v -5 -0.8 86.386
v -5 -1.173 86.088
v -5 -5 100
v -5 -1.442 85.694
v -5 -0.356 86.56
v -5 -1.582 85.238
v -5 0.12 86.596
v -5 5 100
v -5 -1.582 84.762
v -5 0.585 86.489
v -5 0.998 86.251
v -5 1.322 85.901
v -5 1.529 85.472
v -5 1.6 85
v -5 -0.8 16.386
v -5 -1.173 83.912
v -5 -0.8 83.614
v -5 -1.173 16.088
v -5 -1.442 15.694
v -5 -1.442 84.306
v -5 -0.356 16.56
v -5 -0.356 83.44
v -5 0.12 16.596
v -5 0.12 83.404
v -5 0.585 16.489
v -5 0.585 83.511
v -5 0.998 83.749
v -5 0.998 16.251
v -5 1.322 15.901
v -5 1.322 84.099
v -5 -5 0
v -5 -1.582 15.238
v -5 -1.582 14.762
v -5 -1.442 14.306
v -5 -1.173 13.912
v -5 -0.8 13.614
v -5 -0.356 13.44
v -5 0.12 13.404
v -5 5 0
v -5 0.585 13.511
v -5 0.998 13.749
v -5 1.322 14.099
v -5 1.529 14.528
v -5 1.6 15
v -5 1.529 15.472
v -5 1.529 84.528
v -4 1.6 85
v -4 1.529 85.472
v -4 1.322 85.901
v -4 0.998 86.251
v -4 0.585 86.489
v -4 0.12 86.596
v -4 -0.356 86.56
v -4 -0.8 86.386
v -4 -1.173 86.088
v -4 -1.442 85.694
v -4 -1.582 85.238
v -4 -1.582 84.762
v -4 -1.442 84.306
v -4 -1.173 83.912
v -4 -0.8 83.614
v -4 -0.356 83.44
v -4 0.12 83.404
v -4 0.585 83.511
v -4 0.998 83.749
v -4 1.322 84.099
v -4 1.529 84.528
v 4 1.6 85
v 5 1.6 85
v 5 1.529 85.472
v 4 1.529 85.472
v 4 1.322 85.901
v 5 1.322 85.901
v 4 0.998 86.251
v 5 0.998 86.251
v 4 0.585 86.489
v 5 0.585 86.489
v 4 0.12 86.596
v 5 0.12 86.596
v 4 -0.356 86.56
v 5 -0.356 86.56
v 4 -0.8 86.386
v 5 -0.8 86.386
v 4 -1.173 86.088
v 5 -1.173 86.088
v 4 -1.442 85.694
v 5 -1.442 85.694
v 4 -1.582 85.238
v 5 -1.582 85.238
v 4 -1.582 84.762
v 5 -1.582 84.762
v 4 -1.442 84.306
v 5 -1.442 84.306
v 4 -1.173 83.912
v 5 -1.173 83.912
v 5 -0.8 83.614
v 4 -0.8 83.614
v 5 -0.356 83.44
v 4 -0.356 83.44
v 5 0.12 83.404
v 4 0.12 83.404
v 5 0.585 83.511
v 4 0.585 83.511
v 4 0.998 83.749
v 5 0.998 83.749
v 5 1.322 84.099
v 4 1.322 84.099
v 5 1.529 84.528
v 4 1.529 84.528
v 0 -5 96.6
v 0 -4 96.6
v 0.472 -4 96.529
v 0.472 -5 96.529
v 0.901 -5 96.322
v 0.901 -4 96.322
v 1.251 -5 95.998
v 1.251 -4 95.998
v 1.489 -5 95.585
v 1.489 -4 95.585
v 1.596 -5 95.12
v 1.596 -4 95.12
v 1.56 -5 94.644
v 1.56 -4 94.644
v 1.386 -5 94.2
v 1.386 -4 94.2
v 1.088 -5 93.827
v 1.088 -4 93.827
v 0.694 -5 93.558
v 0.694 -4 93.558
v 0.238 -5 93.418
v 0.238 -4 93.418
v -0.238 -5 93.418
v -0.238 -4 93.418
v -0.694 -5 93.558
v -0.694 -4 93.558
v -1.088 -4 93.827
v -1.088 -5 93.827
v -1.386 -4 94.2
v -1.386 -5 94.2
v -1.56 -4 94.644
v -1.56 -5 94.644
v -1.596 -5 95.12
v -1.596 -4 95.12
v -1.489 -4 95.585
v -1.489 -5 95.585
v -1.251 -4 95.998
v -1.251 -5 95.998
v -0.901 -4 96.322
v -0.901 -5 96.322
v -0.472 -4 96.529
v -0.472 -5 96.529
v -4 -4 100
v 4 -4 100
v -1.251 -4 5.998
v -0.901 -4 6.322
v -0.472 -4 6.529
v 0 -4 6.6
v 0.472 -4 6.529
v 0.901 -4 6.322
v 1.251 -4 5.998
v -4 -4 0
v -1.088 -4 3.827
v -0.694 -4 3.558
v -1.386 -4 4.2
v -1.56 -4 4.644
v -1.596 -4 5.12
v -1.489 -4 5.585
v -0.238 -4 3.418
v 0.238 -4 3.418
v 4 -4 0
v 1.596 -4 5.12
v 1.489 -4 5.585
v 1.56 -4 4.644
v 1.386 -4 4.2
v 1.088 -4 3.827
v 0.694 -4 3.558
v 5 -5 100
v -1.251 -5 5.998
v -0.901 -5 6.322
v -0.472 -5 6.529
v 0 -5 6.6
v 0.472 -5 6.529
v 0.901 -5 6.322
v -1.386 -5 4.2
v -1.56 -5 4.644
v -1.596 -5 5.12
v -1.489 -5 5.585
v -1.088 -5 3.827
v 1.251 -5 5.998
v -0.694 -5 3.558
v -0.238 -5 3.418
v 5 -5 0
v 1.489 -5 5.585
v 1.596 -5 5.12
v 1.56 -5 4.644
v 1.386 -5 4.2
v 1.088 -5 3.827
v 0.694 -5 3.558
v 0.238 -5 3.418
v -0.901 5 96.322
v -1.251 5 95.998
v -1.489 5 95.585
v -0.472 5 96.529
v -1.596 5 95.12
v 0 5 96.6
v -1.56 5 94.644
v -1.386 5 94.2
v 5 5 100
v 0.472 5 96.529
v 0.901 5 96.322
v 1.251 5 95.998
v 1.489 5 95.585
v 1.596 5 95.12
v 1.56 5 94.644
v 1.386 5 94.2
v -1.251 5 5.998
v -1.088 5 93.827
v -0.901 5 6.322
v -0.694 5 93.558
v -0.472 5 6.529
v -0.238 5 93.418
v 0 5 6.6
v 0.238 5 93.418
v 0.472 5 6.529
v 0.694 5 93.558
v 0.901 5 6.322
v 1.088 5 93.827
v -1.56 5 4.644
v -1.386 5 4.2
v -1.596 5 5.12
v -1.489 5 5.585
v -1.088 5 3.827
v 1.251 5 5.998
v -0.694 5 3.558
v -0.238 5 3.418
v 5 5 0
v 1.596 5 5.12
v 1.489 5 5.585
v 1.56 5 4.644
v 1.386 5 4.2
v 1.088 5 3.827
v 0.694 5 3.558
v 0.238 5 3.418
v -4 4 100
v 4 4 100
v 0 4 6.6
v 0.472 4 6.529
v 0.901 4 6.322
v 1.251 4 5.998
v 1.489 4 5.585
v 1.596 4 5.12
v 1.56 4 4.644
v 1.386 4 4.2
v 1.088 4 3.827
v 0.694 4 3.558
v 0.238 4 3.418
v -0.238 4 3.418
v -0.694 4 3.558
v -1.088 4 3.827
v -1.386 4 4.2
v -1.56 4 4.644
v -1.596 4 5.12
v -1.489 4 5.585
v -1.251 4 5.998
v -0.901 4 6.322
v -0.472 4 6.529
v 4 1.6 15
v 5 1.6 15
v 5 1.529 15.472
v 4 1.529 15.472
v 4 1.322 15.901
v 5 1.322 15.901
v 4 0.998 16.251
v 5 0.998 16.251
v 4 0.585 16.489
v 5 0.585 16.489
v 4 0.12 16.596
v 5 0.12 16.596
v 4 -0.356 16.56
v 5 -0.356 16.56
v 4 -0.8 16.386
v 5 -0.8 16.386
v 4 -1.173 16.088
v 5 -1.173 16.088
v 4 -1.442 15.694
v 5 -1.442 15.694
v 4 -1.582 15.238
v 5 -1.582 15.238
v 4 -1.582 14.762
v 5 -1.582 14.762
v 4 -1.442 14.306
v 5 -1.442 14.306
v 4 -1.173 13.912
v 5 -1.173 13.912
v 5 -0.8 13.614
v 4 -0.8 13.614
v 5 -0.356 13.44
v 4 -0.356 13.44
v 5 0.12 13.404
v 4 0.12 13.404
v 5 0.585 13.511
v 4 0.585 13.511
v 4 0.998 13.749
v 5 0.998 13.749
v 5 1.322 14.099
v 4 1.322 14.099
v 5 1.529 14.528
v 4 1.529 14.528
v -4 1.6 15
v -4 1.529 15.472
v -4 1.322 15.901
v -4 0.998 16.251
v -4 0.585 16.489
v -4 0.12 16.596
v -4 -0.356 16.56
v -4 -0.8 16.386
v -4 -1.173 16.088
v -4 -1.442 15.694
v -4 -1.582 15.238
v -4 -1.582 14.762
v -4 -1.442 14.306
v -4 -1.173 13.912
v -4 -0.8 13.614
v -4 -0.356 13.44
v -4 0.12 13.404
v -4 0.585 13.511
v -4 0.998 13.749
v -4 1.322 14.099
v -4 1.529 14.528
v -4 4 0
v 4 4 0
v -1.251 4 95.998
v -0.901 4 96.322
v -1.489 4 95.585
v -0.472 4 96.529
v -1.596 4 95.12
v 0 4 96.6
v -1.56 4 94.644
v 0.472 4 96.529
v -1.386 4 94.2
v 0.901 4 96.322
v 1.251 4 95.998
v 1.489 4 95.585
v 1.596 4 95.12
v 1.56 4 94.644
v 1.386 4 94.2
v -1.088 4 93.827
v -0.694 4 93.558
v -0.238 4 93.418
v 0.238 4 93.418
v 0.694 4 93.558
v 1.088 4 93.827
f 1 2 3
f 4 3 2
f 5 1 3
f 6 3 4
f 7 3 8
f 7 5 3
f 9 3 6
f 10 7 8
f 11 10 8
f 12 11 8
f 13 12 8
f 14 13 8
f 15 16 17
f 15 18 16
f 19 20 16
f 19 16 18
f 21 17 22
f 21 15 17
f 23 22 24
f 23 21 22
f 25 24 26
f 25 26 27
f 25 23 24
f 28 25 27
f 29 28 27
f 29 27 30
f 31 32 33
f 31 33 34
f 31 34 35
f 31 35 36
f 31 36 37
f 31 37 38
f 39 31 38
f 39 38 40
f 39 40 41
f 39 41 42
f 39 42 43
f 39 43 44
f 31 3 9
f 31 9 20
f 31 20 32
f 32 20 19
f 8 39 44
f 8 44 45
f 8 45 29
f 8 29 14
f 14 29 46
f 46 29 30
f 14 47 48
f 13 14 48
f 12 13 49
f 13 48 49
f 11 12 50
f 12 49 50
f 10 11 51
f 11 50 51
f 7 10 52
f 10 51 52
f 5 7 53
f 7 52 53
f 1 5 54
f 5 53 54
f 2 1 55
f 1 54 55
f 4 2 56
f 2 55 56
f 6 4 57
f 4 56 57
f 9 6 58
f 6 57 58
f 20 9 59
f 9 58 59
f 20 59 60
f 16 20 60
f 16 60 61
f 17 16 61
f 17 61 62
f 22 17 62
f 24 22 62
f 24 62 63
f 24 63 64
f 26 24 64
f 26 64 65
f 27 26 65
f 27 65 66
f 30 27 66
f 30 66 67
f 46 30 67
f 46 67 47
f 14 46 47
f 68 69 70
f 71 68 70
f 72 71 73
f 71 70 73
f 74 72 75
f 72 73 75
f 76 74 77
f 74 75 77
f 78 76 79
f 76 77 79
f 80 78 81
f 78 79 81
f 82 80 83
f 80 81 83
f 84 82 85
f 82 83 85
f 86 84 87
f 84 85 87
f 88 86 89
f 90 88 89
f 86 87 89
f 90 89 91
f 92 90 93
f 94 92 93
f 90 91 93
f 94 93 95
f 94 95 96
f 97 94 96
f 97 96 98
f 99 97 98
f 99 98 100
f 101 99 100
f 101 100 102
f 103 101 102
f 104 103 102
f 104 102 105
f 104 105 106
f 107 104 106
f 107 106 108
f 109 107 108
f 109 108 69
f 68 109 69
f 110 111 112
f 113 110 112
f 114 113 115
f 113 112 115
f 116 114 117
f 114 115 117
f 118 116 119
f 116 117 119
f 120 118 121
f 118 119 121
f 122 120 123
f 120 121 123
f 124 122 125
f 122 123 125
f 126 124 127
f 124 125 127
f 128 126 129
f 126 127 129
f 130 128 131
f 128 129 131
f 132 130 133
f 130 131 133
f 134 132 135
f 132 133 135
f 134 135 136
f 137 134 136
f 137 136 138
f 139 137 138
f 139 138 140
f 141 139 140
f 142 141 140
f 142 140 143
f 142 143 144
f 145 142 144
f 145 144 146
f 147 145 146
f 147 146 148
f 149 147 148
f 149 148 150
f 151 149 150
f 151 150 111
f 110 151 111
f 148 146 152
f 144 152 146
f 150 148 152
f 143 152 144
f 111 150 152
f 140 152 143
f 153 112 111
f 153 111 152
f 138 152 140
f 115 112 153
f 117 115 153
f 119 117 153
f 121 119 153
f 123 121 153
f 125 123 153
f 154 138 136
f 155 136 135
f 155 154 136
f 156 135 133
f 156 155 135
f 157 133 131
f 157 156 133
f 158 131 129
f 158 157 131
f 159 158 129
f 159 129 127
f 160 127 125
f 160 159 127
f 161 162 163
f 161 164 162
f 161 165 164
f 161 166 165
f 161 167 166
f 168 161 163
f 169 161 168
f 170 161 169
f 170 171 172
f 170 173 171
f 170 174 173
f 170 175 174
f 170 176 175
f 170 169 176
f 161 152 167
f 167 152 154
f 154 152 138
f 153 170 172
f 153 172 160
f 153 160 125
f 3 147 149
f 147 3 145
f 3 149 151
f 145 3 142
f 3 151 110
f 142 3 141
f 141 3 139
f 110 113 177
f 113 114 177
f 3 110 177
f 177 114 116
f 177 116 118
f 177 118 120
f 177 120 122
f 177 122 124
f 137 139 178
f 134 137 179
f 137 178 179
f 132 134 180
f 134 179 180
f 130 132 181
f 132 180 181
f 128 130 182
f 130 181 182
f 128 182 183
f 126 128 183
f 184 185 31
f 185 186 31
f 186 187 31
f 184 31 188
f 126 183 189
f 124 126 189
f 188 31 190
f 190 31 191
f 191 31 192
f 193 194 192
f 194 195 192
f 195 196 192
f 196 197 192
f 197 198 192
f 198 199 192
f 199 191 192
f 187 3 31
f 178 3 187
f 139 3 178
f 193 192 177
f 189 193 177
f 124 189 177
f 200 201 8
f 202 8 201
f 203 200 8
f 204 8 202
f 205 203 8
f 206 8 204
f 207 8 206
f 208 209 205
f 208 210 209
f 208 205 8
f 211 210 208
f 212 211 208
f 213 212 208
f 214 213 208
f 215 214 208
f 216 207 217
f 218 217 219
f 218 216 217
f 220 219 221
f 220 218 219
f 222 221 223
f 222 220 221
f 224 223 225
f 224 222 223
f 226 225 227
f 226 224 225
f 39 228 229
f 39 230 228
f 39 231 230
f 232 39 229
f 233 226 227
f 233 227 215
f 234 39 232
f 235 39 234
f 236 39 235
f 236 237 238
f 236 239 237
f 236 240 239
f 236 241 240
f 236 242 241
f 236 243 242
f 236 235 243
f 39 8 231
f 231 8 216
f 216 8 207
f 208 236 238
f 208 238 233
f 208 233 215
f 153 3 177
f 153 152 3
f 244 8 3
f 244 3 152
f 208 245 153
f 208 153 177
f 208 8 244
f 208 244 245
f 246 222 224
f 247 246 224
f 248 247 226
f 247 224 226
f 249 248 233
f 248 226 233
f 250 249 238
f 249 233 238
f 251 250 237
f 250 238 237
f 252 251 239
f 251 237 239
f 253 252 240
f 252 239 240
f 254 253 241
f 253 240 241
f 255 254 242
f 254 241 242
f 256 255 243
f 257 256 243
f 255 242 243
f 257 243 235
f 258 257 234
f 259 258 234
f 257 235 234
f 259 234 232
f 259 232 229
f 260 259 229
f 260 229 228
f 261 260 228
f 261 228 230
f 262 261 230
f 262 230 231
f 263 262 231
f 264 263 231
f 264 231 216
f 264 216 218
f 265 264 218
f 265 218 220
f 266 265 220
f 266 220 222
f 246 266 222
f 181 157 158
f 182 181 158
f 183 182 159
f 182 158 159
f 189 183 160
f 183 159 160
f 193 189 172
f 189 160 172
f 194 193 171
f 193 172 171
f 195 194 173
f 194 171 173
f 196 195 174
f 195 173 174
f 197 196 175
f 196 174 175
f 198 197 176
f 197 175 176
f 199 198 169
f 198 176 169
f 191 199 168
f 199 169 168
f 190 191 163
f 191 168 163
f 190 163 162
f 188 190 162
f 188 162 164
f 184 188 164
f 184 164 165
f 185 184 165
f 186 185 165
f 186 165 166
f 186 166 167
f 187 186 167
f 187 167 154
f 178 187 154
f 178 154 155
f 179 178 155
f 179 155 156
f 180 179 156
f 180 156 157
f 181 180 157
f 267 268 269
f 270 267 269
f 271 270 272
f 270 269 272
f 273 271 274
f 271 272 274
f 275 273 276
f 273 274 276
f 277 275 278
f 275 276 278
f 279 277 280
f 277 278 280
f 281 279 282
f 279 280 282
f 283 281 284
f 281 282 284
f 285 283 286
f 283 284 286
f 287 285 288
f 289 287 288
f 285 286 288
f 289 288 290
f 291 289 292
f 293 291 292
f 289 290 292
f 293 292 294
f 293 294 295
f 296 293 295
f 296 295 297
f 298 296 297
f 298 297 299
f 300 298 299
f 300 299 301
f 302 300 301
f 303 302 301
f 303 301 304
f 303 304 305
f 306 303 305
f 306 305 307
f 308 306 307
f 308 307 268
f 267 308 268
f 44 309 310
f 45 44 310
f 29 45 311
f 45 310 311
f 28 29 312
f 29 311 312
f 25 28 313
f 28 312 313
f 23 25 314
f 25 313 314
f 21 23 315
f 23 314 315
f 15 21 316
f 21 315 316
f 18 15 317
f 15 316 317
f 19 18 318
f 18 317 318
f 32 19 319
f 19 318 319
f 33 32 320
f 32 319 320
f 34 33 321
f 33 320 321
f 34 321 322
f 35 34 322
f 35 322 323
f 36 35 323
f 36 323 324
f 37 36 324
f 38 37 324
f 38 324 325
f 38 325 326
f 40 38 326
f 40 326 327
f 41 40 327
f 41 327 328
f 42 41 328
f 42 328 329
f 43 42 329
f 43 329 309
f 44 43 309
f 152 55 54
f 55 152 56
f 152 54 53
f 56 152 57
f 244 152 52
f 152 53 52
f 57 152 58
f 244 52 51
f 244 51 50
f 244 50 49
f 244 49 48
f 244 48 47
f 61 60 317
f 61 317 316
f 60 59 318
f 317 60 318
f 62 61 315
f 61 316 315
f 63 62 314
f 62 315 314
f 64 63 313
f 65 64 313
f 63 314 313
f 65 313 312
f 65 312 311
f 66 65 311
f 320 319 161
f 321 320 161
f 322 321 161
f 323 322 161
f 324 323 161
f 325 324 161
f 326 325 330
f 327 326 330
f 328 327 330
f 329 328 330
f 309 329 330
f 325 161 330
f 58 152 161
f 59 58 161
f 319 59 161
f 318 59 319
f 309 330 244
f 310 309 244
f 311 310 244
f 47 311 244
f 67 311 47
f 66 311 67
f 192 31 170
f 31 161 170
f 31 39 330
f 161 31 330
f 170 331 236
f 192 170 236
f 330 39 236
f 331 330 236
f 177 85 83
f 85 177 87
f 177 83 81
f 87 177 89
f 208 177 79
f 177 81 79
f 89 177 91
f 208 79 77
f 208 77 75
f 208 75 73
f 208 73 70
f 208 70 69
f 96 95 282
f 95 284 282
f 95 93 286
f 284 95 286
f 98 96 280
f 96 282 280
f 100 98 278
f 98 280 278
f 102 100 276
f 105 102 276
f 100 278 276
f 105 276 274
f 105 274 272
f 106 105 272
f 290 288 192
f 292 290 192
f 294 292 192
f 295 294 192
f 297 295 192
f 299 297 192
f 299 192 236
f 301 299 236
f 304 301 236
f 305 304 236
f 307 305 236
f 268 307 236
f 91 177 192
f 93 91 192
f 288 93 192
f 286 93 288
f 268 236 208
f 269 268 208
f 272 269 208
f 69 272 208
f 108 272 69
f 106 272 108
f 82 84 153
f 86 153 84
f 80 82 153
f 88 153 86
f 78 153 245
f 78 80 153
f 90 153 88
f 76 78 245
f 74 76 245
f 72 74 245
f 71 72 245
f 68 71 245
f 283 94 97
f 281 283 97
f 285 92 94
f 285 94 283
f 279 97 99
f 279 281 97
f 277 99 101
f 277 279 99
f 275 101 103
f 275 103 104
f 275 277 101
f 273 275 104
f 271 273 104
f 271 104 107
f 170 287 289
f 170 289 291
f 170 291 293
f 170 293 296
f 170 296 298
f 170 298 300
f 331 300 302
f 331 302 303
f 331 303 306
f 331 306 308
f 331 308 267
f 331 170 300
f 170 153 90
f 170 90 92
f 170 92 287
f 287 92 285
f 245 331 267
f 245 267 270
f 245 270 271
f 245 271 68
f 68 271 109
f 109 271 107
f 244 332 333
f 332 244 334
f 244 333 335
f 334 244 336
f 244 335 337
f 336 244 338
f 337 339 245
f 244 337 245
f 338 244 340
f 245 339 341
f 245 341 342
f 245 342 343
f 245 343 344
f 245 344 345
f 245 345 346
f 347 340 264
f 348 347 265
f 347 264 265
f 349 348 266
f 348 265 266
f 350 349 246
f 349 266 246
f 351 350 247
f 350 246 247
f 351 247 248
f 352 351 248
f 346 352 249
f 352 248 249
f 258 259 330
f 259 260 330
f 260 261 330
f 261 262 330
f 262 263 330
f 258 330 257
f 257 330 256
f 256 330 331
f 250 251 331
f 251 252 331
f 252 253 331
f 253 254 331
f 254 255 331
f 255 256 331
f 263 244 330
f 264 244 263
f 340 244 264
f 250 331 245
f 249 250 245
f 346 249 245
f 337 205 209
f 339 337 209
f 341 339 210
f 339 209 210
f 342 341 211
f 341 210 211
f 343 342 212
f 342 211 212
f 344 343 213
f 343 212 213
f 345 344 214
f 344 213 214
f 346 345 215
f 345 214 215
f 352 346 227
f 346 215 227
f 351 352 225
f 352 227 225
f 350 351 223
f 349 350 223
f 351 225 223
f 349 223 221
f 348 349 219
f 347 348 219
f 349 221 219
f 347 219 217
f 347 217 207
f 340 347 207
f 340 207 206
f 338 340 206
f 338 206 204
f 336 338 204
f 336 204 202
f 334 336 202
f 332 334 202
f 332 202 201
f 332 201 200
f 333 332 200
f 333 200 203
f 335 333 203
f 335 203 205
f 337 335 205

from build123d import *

# Parameters (mm, degrees)
SKETCH_1_W          = 10
SKETCH_1_H          = 10
SKETCH_1_W_2        = 8
SKETCH_1_H_2        = 8
EXTRUDE_1_DEPTH     = 100
SKETCH_2_R          = 1.6
CUT_EXTRUDE_1_DEPTH = 101.623058987
SKETCH_3_R          = 1.6
CUT_EXTRUDE_2_DEPTH = 100


with BuildPart() as part:
    # ｽｹｯﾁ1 → ﾎﾞｽ - 押し出し1 (new body)
    with BuildSketch(Plane.XY):
        Rectangle(SKETCH_1_W, SKETCH_1_H)
        Rectangle(SKETCH_1_W_2, SKETCH_1_H_2, mode=Mode.SUBTRACT)
    extrude(amount=EXTRUDE_1_DEPTH)

    # ｽｹｯﾁ2 → ｶｯﾄ - 押し出し1 (cut, through all)
    with BuildSketch(Plane(origin=(5, 0, 0), x_dir=(0, 0, -1), z_dir=(1, 0, 0))):
        with Locations(Location((-85, 0, 0), (0, 0, 90))):
            Circle(SKETCH_2_R)
        with Locations(Location((-15, 0, 0), (0, 0, 90))):
            Circle(SKETCH_2_R)
    extrude(amount=-CUT_EXTRUDE_1_DEPTH, mode=Mode.SUBTRACT)

    # ｽｹｯﾁ3 → ｶｯﾄ - 押し出し2 (cut)
    with BuildSketch(Plane(origin=(0, 5, 0), x_dir=(1, 0, 0), z_dir=(0, 1, 0))):
        with Locations(Location((0, -95, 0), (0, 0, 270))):
            Circle(SKETCH_3_R)
        with Locations(Location((0, -5, 0), (0, 0, 270))):
            Circle(SKETCH_3_R)
    extrude(amount=-CUT_EXTRUDE_2_DEPTH, mode=Mode.SUBTRACT)


solid = part.part
